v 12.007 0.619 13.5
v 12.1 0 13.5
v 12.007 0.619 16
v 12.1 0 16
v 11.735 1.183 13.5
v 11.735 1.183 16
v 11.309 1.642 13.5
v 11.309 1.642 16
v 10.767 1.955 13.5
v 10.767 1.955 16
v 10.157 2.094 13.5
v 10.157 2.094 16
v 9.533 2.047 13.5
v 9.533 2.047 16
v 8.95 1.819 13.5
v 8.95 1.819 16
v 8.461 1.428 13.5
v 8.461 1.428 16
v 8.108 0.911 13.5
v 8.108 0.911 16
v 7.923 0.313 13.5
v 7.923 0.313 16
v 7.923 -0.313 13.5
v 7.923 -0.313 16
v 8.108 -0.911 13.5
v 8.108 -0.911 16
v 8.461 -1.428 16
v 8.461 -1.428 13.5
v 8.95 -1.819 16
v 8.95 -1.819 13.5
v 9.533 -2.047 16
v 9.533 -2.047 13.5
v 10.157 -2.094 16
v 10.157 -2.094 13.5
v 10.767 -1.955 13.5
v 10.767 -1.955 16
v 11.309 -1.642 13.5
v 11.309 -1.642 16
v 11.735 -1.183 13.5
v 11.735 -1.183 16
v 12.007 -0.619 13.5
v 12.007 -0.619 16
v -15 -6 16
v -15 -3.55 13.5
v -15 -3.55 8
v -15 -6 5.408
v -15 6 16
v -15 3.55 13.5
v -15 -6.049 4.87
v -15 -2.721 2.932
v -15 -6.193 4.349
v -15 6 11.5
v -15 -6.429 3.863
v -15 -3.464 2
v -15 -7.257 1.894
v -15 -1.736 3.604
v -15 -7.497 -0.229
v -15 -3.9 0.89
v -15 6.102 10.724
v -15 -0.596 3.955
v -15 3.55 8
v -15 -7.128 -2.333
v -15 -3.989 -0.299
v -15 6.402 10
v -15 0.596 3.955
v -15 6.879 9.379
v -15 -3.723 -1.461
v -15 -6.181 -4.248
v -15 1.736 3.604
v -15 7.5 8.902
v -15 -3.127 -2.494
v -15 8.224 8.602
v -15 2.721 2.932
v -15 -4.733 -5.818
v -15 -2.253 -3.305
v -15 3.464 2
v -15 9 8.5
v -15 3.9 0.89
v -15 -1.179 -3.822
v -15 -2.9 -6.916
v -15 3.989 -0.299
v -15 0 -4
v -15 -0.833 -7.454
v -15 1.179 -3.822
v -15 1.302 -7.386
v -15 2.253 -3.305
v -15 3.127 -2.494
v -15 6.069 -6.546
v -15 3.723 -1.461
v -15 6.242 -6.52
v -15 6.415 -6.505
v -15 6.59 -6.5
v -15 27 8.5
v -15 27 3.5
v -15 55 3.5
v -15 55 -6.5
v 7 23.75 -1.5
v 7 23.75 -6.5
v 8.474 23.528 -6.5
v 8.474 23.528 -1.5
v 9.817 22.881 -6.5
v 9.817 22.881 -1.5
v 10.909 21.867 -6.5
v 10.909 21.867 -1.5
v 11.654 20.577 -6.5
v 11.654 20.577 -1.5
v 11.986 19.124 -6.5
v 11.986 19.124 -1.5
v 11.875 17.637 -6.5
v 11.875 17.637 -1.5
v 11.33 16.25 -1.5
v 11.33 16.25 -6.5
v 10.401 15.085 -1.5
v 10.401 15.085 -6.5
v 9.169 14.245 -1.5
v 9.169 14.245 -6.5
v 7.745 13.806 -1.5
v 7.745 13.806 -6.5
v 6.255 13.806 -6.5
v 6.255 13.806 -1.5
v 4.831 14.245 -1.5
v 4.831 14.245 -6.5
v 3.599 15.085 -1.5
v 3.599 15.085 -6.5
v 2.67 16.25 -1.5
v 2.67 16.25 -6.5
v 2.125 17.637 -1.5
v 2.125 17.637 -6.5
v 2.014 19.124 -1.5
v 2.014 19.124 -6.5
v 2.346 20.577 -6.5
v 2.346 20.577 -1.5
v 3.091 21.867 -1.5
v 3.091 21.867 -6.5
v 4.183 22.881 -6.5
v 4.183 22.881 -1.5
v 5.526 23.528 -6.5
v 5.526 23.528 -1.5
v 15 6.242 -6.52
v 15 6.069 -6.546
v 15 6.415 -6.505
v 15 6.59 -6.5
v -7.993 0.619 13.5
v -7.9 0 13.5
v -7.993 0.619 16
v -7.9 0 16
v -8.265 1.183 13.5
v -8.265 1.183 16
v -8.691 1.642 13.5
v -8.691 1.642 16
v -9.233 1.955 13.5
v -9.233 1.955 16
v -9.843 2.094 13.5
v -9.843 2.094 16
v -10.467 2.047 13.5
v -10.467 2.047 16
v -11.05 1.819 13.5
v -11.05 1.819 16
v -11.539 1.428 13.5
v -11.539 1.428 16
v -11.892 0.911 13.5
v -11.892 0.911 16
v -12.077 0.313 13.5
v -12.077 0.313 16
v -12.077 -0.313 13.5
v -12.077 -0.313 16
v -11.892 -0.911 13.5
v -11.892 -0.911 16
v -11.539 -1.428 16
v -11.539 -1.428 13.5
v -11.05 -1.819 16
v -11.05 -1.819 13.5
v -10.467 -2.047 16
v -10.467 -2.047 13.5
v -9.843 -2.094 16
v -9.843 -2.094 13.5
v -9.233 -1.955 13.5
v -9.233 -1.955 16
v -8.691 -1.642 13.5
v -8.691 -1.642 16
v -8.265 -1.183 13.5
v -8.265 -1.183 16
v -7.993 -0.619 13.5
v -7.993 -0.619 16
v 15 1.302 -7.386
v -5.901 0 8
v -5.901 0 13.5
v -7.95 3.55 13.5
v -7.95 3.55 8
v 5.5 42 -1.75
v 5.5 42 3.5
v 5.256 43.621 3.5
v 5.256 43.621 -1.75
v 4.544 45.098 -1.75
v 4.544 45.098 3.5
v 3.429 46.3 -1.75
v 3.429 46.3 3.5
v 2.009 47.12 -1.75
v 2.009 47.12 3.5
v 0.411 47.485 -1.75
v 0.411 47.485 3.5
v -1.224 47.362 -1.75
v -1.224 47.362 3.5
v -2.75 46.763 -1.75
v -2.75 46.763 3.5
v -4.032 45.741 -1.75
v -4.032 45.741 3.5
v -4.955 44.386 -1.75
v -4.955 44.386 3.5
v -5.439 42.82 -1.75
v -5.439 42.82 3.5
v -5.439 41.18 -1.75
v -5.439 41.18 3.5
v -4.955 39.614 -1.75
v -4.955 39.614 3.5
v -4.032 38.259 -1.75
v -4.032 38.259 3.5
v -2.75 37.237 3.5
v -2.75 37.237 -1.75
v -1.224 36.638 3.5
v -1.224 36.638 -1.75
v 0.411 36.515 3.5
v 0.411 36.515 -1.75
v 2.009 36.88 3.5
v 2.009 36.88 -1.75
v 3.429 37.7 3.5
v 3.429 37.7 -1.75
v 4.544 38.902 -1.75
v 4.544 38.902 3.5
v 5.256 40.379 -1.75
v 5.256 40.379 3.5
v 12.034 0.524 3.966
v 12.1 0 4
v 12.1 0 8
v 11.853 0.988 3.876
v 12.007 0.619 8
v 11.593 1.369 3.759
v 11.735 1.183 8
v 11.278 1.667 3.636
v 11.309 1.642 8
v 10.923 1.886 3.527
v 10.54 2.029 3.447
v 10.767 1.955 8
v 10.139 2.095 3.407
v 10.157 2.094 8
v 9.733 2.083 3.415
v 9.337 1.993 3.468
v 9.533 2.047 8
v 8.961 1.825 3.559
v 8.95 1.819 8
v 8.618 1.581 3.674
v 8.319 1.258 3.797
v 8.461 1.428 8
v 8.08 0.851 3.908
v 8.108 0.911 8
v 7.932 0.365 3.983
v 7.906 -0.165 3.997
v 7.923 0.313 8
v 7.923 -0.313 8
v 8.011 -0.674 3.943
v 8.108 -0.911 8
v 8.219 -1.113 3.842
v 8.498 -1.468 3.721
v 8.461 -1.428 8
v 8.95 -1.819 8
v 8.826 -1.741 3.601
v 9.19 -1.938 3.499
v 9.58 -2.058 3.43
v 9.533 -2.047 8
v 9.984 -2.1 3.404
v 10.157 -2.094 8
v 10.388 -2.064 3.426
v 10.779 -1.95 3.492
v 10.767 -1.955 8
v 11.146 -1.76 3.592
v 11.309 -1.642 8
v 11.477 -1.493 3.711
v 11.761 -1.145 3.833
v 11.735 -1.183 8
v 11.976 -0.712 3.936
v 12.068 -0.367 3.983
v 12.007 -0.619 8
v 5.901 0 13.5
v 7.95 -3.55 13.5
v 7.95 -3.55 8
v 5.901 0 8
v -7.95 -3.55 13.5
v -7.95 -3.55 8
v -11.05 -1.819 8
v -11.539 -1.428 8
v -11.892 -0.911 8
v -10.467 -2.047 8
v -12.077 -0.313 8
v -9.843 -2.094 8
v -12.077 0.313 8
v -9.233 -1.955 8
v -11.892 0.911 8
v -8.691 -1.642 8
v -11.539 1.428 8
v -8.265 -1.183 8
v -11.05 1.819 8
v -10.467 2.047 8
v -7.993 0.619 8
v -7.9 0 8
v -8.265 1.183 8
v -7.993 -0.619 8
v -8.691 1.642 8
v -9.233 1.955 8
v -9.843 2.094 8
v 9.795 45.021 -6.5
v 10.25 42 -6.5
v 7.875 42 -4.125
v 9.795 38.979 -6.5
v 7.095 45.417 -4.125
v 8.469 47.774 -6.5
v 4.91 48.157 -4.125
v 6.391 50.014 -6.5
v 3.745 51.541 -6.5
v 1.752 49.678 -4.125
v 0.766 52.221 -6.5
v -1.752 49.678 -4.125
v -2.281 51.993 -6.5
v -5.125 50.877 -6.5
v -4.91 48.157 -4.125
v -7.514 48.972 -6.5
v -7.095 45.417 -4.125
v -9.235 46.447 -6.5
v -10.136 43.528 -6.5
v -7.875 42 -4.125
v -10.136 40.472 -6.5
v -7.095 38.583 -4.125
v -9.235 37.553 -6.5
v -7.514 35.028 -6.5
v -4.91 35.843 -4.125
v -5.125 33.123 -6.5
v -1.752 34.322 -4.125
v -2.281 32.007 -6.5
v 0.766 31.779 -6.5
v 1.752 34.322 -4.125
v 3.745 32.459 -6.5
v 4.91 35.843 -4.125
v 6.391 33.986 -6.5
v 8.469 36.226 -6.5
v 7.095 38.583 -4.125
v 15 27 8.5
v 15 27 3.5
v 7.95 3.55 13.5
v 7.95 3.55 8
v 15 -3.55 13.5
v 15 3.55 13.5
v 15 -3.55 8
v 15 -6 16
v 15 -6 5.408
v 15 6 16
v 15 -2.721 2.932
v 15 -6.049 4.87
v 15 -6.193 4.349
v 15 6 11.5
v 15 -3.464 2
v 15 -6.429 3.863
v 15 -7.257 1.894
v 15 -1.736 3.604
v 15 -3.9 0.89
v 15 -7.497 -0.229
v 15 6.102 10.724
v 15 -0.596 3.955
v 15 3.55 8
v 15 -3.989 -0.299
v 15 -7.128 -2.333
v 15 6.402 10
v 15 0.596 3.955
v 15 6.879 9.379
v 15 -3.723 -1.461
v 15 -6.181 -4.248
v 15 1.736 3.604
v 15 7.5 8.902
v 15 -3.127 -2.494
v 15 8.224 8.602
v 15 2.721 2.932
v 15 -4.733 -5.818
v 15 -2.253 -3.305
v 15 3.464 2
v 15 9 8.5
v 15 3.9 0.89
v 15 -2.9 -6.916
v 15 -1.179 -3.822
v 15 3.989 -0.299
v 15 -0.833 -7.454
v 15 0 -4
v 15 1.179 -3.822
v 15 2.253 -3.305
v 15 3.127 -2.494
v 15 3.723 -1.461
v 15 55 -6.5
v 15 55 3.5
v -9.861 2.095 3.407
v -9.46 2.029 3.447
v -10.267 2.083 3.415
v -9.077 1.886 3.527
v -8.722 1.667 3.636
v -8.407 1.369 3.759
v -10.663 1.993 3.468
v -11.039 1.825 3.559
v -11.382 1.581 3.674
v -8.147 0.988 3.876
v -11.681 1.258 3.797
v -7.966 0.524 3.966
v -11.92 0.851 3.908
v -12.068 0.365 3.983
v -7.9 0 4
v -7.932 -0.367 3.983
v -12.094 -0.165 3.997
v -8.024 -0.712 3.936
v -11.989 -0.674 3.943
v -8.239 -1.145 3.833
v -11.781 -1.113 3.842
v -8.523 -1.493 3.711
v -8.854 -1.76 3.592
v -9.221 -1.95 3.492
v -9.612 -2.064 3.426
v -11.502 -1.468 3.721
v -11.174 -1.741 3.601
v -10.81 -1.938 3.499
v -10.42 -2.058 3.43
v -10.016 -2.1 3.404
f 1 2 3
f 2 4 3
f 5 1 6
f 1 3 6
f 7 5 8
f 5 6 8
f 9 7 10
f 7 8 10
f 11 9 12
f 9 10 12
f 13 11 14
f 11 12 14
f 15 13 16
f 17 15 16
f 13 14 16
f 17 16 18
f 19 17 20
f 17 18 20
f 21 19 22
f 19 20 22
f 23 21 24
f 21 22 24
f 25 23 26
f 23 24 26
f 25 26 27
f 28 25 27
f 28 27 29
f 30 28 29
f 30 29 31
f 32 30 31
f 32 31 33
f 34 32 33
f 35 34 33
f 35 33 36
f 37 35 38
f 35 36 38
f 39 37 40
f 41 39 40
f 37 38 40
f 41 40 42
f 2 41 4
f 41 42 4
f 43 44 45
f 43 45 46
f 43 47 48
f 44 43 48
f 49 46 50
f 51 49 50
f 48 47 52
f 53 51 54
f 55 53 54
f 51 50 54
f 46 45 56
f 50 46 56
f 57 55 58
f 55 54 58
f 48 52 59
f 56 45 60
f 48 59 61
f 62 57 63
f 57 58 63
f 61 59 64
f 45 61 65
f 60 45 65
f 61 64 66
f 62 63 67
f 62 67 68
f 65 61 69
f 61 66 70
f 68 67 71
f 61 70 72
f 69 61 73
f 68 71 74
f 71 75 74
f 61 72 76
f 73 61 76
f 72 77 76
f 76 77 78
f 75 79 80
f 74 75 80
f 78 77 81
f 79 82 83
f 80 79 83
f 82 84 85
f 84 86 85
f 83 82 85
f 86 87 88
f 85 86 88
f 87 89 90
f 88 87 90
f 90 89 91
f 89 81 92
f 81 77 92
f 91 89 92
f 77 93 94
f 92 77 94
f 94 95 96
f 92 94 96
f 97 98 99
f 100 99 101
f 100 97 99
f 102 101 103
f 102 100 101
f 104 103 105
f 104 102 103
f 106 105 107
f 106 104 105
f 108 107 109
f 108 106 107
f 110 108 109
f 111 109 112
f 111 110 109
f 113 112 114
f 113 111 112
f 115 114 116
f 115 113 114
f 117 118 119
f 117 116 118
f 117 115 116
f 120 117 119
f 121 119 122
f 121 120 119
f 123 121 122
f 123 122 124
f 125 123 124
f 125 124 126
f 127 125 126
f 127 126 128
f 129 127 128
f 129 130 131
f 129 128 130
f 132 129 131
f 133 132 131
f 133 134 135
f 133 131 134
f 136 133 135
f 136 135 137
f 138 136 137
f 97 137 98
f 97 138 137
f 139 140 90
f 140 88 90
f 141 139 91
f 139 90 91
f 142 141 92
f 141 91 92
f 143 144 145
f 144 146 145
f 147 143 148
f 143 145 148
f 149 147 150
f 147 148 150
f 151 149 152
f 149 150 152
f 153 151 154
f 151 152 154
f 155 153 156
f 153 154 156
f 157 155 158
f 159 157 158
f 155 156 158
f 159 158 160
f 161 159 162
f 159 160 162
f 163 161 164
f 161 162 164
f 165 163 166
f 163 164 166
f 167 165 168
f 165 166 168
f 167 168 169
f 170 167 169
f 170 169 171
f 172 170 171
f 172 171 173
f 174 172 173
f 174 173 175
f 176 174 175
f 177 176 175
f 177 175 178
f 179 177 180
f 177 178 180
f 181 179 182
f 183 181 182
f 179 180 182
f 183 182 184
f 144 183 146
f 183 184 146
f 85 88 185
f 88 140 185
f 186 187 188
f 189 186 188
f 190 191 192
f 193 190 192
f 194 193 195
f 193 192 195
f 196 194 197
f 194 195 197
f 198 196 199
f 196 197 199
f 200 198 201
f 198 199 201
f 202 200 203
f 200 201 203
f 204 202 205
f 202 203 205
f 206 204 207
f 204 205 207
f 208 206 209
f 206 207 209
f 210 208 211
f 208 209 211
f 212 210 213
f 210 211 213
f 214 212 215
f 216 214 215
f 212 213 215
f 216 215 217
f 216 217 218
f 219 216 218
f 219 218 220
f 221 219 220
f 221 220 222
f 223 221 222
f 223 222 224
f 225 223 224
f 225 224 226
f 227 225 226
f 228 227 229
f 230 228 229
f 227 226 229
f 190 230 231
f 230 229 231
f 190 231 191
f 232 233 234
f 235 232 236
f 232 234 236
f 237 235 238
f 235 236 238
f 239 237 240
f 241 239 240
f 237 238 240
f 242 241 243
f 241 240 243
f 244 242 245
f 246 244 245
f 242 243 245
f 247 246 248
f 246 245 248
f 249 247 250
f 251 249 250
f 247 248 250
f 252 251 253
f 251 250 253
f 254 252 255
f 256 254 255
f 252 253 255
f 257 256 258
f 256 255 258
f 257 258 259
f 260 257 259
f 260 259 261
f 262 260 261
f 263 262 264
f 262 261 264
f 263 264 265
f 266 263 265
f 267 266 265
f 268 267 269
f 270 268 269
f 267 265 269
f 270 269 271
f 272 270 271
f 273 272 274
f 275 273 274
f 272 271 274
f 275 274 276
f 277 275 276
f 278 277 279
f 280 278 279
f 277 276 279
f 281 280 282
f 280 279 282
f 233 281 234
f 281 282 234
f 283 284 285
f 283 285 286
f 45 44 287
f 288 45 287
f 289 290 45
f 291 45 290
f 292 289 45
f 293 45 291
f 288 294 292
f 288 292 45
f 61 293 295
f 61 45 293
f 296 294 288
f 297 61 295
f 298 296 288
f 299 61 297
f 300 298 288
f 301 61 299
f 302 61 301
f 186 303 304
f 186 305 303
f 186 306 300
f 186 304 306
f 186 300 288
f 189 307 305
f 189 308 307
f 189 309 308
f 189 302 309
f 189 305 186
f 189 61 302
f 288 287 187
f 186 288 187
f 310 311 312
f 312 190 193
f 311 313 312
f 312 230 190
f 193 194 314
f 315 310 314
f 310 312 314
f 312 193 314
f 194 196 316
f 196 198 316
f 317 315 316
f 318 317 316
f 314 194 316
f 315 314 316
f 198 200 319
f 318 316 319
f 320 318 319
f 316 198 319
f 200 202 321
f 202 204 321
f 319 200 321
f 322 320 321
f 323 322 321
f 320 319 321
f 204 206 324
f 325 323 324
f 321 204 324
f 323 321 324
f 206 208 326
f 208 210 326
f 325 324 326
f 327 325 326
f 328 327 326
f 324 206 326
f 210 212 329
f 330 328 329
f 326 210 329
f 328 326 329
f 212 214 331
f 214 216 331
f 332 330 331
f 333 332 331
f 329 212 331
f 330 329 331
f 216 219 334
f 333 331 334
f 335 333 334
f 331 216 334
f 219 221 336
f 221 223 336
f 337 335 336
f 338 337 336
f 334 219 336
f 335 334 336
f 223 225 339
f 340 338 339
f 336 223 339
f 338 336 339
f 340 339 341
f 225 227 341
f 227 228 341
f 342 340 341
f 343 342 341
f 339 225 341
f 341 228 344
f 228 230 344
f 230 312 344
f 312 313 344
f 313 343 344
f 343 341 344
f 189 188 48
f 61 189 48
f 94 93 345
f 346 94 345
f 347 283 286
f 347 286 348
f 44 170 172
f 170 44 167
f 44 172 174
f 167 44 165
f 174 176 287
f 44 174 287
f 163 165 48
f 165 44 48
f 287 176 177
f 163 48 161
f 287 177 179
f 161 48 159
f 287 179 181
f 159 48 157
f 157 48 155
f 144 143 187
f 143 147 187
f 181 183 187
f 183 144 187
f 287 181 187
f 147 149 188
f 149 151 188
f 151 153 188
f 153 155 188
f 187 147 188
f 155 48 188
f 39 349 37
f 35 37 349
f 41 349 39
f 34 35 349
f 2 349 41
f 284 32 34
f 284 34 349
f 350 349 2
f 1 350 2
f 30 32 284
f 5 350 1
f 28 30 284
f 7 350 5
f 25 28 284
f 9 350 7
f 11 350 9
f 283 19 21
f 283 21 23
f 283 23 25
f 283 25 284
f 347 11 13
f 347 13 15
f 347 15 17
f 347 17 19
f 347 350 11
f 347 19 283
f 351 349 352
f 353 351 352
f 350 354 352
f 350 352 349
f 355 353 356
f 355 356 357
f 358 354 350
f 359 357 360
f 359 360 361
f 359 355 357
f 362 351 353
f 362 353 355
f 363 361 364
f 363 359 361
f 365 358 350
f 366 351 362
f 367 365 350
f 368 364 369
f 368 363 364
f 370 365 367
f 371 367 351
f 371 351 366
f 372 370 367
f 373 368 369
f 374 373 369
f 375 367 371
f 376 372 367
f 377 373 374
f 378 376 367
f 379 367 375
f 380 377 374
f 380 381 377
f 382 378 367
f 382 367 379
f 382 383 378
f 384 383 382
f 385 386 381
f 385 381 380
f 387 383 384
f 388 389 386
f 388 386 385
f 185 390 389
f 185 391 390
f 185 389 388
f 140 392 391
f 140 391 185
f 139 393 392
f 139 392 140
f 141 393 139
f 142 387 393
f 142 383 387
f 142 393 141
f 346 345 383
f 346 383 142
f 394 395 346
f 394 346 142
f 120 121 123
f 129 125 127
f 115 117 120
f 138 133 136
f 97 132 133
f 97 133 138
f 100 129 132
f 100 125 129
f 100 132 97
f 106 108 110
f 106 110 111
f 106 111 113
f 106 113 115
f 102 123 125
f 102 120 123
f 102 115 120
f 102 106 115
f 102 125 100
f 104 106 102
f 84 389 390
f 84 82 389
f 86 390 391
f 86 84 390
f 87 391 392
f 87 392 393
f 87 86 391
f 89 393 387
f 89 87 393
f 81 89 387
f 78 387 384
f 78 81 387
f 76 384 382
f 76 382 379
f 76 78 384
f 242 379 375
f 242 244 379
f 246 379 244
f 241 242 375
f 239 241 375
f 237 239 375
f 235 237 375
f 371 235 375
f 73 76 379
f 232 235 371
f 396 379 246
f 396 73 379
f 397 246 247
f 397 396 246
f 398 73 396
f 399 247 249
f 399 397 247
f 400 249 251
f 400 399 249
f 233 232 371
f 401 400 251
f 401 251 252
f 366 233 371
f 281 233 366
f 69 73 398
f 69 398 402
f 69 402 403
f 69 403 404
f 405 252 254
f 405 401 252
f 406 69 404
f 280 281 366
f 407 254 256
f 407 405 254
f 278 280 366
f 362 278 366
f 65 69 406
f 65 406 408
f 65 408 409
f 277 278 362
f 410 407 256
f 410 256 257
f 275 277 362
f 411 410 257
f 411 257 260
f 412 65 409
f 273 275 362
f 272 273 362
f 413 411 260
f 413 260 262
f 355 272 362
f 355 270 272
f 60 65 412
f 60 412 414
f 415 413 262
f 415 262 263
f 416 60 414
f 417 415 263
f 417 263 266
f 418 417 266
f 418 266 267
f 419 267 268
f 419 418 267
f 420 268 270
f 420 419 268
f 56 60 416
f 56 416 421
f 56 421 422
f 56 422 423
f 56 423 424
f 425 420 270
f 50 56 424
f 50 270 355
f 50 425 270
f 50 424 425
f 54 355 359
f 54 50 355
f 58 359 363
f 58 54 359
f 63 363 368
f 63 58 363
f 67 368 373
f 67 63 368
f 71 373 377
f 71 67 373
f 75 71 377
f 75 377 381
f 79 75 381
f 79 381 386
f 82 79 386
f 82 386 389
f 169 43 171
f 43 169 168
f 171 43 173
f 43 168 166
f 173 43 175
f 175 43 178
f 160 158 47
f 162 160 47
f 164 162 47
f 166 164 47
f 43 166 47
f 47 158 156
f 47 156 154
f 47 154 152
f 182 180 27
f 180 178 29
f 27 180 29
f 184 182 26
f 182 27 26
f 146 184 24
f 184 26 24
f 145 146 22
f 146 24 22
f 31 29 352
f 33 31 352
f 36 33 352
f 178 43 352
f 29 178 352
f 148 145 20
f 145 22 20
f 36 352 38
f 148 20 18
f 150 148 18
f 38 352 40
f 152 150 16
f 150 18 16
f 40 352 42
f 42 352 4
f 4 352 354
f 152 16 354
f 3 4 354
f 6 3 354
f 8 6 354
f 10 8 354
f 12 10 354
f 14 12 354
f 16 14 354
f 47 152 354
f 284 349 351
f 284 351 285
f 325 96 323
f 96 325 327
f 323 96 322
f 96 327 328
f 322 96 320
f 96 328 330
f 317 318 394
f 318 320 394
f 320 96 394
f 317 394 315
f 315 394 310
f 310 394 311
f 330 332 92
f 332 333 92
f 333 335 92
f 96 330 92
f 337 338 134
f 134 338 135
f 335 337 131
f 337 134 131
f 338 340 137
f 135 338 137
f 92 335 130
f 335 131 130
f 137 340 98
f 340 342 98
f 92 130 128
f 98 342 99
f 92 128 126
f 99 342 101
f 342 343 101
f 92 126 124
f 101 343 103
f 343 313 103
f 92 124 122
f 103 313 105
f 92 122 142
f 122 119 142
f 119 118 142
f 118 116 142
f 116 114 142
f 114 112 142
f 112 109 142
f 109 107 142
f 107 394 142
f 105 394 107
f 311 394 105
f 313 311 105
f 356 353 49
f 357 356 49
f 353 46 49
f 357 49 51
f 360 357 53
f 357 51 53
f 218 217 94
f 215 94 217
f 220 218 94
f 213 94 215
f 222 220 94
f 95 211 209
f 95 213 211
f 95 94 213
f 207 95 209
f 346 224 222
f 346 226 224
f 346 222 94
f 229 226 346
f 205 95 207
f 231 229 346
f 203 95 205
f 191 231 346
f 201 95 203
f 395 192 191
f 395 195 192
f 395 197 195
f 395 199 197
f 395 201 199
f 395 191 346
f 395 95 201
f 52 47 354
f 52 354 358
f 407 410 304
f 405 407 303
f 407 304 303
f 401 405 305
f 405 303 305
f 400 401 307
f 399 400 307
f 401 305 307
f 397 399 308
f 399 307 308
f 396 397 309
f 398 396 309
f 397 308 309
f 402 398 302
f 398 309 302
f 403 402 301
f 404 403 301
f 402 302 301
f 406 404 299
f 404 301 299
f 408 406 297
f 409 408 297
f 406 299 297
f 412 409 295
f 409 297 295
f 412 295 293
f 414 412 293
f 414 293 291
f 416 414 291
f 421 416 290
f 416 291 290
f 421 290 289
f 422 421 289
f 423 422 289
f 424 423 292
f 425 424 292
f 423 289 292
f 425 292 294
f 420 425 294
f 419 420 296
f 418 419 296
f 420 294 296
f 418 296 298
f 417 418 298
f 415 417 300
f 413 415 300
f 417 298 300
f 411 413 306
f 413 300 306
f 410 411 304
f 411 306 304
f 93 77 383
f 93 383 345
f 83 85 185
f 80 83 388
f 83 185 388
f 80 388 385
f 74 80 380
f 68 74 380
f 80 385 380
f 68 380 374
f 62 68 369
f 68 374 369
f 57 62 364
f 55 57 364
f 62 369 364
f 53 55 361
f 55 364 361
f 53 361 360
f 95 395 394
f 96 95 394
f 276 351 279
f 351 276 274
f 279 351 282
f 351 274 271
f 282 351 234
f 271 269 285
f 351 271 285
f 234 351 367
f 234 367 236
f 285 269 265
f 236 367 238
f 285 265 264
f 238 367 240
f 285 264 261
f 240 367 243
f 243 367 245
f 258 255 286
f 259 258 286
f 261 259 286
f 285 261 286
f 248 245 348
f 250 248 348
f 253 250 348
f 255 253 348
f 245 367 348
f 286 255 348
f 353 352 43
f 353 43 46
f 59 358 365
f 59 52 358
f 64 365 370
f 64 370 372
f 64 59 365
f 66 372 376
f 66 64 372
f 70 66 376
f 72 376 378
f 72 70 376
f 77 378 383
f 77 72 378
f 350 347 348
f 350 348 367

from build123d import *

# Parameters (mm, degrees)
SKETCH1_R                                           = 4
BOSS_EXTRUDE1_DEPTH                                 = 15
SKETCH2_W                                           = 11.5
SKETCH2_H                                           = 12
BOSS_EXTRUDE2_DEPTH                                 = 30
FILLET1_R                                           = 3
SKETCH3_R                                           = 2.1
CUT_EXTRUDE1_DEPTH                                  = 60.211485372
CUT_EXTRUDE2_REACH                                  = 63.662
CUT_EXTRUDE2_END_RADIUS                             = 4
SKETCH4_R                                           = 2.1
CUT_EXTRUDE3_START                                  = -2.5
CUT_EXTRUDE3_DEPTH                                  = 5.5
CUT_EXTRUDE4_DEPTH                                  = 62.288253385
CUT_EXTRUDE4_DEPTH_BACK                             = 5
SKETCH6_R                                           = 5
CSK_FOR_M10_HEX_SOCKET_COUNTERSUNK_HEAD_D           = 11
CSK_FOR_M10_HEX_SOCKET_COUNTERSUNK_HEAD_CSINK_D     = 20.5
CSK_FOR_M10_HEX_SOCKET_COUNTERSUNK_HEAD_CSINK_ANGLE = 90
SKETCH9_W                                           = 30
SKETCH9_H                                           = 28
CUT_EXTRUDE5_DEPTH                                  = 5


with BuildPart() as part:
    # Sketch1 → Boss-Extrude1 (new, symmetric)
    with BuildSketch(Plane(origin=(0, 0, 0), x_dir=(0, 0, -1), z_dir=(1, 0, 0))):
        with BuildLine():
            Line((6.5, 55), (6.5, 6.327446796))
            Line((6.5, 6.327446796), (7.386058148, 1.302361333))
            ThreePointArc((7.386058148, 1.302361333), (1.302361333, -7.386058148), (-7.386058148, -1.302361333))
            Line((-7.386058148, -1.302361333), (-8.5, 5.015116843))
            Line((-8.5, 5.015116843), (-8.5, 55))
            Line((-8.5, 55), (6.5, 55))
        make_face()
        Circle(SKETCH1_R, mode=Mode.SUBTRACT)
    extrude(amount=BOSS_EXTRUDE1_DEPTH, both=True)

    # Sketch2 → Boss-Extrude2 (add)
    with BuildSketch(Plane(origin=(15, 0, 0), x_dir=(0, 0, -1), z_dir=(1, 0, 0))):
        with Locations((-10.25, 0)):
            Rectangle(SKETCH2_W, SKETCH2_H)
    extrude(amount=-BOSS_EXTRUDE2_DEPTH)

    # Fillet1
    fillet1_edges = [part.edges().sort_by_distance(p)[0] for p in [
        (0, 6.327446796, -6.5),
        (0, 6, 8.5),
        (0, -6, 4.5),
    ]]
    fillet(fillet1_edges, radius=FILLET1_R)

    # Sketch3 → Cut-Extrude1 (cut, through all)
    with BuildSketch(Plane.XY.offset(8.5)):
        with Locations((0, 42)):
            Circle(SKETCH3_R)
    extrude(amount=-CUT_EXTRUDE1_DEPTH, mode=Mode.SUBTRACT)

    # Cut-Extrude2: up to this cylinder (the profile starts outside it)
    cut_extrude2_end = Plane(origin=(0, 0, 0), z_dir=(-1, 0, 0)) * Cylinder(CUT_EXTRUDE2_END_RADIUS, 156.324, mode=Mode.PRIVATE)
    # Sketch4 → Cut-Extrude2 (cut, up to the surface)
    with BuildSketch(Plane.XY.offset(16), mode=Mode.PRIVATE) as cut_extrude2_sk1:
        with Locations((-10, 0)):
            Circle(SKETCH4_R)
    cut_extrude2_tool1 = extrude(cut_extrude2_sk1.sketch, amount=-CUT_EXTRUDE2_REACH, mode=Mode.PRIVATE) - cut_extrude2_end
    add(cut_extrude2_tool1.solids().sort_by_distance((-10, 0, 16))[0], mode=Mode.SUBTRACT)
    # Sketch4 → Cut-Extrude2 (cut, up to the surface)
    with BuildSketch(Plane.XY.offset(16), mode=Mode.PRIVATE) as cut_extrude2_sk2:
        with Locations((10, 0)):
            Circle(SKETCH4_R)
    cut_extrude2_tool2 = extrude(cut_extrude2_sk2.sketch, amount=-CUT_EXTRUDE2_REACH, mode=Mode.PRIVATE) - cut_extrude2_end
    add(cut_extrude2_tool2.solids().sort_by_distance((10, 0, 16))[0], mode=Mode.SUBTRACT)

    # Sketch5 → Cut-Extrude3 (cut)
    with BuildSketch(Plane.XY.offset(16).offset(CUT_EXTRUDE3_START)):
        Polygon((-12.049593456, 3.55), (-15, 3.55), (-15, -3.55), (-12.049593456, -3.55), (-7.950406544, -3.55), (-5.900813089, 0), (-7.950406544, 3.55), align=None)
    cut_extrude3 = extrude(amount=-CUT_EXTRUDE3_DEPTH, mode=Mode.SUBTRACT)

    # Mirror1: Cut-Extrude3 across plane
    add(cut_extrude3.mirror(Plane(origin=(0, 0, 0), x_dir=(0, 0, 1), z_dir=(1, 0, 0))), mode=Mode.SUBTRACT)

    # Sketch6 → Cut-Extrude4 (cut, two sides: drawn at the far end of the back side and taken through both)
    with BuildSketch(Plane(origin=(0, 0, -6.5), x_dir=(-1, 0, 0), z_dir=(0, 0, -1)).offset(-CUT_EXTRUDE4_DEPTH_BACK)):
        with Locations(Location((-7, 18.75, 0), (0, 0, 90))):
            Circle(SKETCH6_R)
    extrude(amount=CUT_EXTRUDE4_DEPTH + CUT_EXTRUDE4_DEPTH_BACK, mode=Mode.SUBTRACT)

    # CSK for M10 Hex Socket Countersunk Head Screw1 (through all)
    with Locations(Plane(origin=(0, 0, -6.5), x_dir=(-1, 0, 0), z_dir=(0, 0, -1))):
        with Locations((0, 42)):
            CounterSinkHole(CSK_FOR_M10_HEX_SOCKET_COUNTERSUNK_HEAD_D / 2, CSK_FOR_M10_HEX_SOCKET_COUNTERSUNK_HEAD_CSINK_D / 2, counter_sink_angle=CSK_FOR_M10_HEX_SOCKET_COUNTERSUNK_HEAD_CSINK_ANGLE)

    # Sketch9 → Cut-Extrude5 (cut)
    with BuildSketch(Plane.XY.offset(8.5)):
        with Locations((0, 41)):
            Rectangle(SKETCH9_W, SKETCH9_H)
    extrude(amount=-CUT_EXTRUDE5_DEPTH, mode=Mode.SUBTRACT)


solid = part.part
